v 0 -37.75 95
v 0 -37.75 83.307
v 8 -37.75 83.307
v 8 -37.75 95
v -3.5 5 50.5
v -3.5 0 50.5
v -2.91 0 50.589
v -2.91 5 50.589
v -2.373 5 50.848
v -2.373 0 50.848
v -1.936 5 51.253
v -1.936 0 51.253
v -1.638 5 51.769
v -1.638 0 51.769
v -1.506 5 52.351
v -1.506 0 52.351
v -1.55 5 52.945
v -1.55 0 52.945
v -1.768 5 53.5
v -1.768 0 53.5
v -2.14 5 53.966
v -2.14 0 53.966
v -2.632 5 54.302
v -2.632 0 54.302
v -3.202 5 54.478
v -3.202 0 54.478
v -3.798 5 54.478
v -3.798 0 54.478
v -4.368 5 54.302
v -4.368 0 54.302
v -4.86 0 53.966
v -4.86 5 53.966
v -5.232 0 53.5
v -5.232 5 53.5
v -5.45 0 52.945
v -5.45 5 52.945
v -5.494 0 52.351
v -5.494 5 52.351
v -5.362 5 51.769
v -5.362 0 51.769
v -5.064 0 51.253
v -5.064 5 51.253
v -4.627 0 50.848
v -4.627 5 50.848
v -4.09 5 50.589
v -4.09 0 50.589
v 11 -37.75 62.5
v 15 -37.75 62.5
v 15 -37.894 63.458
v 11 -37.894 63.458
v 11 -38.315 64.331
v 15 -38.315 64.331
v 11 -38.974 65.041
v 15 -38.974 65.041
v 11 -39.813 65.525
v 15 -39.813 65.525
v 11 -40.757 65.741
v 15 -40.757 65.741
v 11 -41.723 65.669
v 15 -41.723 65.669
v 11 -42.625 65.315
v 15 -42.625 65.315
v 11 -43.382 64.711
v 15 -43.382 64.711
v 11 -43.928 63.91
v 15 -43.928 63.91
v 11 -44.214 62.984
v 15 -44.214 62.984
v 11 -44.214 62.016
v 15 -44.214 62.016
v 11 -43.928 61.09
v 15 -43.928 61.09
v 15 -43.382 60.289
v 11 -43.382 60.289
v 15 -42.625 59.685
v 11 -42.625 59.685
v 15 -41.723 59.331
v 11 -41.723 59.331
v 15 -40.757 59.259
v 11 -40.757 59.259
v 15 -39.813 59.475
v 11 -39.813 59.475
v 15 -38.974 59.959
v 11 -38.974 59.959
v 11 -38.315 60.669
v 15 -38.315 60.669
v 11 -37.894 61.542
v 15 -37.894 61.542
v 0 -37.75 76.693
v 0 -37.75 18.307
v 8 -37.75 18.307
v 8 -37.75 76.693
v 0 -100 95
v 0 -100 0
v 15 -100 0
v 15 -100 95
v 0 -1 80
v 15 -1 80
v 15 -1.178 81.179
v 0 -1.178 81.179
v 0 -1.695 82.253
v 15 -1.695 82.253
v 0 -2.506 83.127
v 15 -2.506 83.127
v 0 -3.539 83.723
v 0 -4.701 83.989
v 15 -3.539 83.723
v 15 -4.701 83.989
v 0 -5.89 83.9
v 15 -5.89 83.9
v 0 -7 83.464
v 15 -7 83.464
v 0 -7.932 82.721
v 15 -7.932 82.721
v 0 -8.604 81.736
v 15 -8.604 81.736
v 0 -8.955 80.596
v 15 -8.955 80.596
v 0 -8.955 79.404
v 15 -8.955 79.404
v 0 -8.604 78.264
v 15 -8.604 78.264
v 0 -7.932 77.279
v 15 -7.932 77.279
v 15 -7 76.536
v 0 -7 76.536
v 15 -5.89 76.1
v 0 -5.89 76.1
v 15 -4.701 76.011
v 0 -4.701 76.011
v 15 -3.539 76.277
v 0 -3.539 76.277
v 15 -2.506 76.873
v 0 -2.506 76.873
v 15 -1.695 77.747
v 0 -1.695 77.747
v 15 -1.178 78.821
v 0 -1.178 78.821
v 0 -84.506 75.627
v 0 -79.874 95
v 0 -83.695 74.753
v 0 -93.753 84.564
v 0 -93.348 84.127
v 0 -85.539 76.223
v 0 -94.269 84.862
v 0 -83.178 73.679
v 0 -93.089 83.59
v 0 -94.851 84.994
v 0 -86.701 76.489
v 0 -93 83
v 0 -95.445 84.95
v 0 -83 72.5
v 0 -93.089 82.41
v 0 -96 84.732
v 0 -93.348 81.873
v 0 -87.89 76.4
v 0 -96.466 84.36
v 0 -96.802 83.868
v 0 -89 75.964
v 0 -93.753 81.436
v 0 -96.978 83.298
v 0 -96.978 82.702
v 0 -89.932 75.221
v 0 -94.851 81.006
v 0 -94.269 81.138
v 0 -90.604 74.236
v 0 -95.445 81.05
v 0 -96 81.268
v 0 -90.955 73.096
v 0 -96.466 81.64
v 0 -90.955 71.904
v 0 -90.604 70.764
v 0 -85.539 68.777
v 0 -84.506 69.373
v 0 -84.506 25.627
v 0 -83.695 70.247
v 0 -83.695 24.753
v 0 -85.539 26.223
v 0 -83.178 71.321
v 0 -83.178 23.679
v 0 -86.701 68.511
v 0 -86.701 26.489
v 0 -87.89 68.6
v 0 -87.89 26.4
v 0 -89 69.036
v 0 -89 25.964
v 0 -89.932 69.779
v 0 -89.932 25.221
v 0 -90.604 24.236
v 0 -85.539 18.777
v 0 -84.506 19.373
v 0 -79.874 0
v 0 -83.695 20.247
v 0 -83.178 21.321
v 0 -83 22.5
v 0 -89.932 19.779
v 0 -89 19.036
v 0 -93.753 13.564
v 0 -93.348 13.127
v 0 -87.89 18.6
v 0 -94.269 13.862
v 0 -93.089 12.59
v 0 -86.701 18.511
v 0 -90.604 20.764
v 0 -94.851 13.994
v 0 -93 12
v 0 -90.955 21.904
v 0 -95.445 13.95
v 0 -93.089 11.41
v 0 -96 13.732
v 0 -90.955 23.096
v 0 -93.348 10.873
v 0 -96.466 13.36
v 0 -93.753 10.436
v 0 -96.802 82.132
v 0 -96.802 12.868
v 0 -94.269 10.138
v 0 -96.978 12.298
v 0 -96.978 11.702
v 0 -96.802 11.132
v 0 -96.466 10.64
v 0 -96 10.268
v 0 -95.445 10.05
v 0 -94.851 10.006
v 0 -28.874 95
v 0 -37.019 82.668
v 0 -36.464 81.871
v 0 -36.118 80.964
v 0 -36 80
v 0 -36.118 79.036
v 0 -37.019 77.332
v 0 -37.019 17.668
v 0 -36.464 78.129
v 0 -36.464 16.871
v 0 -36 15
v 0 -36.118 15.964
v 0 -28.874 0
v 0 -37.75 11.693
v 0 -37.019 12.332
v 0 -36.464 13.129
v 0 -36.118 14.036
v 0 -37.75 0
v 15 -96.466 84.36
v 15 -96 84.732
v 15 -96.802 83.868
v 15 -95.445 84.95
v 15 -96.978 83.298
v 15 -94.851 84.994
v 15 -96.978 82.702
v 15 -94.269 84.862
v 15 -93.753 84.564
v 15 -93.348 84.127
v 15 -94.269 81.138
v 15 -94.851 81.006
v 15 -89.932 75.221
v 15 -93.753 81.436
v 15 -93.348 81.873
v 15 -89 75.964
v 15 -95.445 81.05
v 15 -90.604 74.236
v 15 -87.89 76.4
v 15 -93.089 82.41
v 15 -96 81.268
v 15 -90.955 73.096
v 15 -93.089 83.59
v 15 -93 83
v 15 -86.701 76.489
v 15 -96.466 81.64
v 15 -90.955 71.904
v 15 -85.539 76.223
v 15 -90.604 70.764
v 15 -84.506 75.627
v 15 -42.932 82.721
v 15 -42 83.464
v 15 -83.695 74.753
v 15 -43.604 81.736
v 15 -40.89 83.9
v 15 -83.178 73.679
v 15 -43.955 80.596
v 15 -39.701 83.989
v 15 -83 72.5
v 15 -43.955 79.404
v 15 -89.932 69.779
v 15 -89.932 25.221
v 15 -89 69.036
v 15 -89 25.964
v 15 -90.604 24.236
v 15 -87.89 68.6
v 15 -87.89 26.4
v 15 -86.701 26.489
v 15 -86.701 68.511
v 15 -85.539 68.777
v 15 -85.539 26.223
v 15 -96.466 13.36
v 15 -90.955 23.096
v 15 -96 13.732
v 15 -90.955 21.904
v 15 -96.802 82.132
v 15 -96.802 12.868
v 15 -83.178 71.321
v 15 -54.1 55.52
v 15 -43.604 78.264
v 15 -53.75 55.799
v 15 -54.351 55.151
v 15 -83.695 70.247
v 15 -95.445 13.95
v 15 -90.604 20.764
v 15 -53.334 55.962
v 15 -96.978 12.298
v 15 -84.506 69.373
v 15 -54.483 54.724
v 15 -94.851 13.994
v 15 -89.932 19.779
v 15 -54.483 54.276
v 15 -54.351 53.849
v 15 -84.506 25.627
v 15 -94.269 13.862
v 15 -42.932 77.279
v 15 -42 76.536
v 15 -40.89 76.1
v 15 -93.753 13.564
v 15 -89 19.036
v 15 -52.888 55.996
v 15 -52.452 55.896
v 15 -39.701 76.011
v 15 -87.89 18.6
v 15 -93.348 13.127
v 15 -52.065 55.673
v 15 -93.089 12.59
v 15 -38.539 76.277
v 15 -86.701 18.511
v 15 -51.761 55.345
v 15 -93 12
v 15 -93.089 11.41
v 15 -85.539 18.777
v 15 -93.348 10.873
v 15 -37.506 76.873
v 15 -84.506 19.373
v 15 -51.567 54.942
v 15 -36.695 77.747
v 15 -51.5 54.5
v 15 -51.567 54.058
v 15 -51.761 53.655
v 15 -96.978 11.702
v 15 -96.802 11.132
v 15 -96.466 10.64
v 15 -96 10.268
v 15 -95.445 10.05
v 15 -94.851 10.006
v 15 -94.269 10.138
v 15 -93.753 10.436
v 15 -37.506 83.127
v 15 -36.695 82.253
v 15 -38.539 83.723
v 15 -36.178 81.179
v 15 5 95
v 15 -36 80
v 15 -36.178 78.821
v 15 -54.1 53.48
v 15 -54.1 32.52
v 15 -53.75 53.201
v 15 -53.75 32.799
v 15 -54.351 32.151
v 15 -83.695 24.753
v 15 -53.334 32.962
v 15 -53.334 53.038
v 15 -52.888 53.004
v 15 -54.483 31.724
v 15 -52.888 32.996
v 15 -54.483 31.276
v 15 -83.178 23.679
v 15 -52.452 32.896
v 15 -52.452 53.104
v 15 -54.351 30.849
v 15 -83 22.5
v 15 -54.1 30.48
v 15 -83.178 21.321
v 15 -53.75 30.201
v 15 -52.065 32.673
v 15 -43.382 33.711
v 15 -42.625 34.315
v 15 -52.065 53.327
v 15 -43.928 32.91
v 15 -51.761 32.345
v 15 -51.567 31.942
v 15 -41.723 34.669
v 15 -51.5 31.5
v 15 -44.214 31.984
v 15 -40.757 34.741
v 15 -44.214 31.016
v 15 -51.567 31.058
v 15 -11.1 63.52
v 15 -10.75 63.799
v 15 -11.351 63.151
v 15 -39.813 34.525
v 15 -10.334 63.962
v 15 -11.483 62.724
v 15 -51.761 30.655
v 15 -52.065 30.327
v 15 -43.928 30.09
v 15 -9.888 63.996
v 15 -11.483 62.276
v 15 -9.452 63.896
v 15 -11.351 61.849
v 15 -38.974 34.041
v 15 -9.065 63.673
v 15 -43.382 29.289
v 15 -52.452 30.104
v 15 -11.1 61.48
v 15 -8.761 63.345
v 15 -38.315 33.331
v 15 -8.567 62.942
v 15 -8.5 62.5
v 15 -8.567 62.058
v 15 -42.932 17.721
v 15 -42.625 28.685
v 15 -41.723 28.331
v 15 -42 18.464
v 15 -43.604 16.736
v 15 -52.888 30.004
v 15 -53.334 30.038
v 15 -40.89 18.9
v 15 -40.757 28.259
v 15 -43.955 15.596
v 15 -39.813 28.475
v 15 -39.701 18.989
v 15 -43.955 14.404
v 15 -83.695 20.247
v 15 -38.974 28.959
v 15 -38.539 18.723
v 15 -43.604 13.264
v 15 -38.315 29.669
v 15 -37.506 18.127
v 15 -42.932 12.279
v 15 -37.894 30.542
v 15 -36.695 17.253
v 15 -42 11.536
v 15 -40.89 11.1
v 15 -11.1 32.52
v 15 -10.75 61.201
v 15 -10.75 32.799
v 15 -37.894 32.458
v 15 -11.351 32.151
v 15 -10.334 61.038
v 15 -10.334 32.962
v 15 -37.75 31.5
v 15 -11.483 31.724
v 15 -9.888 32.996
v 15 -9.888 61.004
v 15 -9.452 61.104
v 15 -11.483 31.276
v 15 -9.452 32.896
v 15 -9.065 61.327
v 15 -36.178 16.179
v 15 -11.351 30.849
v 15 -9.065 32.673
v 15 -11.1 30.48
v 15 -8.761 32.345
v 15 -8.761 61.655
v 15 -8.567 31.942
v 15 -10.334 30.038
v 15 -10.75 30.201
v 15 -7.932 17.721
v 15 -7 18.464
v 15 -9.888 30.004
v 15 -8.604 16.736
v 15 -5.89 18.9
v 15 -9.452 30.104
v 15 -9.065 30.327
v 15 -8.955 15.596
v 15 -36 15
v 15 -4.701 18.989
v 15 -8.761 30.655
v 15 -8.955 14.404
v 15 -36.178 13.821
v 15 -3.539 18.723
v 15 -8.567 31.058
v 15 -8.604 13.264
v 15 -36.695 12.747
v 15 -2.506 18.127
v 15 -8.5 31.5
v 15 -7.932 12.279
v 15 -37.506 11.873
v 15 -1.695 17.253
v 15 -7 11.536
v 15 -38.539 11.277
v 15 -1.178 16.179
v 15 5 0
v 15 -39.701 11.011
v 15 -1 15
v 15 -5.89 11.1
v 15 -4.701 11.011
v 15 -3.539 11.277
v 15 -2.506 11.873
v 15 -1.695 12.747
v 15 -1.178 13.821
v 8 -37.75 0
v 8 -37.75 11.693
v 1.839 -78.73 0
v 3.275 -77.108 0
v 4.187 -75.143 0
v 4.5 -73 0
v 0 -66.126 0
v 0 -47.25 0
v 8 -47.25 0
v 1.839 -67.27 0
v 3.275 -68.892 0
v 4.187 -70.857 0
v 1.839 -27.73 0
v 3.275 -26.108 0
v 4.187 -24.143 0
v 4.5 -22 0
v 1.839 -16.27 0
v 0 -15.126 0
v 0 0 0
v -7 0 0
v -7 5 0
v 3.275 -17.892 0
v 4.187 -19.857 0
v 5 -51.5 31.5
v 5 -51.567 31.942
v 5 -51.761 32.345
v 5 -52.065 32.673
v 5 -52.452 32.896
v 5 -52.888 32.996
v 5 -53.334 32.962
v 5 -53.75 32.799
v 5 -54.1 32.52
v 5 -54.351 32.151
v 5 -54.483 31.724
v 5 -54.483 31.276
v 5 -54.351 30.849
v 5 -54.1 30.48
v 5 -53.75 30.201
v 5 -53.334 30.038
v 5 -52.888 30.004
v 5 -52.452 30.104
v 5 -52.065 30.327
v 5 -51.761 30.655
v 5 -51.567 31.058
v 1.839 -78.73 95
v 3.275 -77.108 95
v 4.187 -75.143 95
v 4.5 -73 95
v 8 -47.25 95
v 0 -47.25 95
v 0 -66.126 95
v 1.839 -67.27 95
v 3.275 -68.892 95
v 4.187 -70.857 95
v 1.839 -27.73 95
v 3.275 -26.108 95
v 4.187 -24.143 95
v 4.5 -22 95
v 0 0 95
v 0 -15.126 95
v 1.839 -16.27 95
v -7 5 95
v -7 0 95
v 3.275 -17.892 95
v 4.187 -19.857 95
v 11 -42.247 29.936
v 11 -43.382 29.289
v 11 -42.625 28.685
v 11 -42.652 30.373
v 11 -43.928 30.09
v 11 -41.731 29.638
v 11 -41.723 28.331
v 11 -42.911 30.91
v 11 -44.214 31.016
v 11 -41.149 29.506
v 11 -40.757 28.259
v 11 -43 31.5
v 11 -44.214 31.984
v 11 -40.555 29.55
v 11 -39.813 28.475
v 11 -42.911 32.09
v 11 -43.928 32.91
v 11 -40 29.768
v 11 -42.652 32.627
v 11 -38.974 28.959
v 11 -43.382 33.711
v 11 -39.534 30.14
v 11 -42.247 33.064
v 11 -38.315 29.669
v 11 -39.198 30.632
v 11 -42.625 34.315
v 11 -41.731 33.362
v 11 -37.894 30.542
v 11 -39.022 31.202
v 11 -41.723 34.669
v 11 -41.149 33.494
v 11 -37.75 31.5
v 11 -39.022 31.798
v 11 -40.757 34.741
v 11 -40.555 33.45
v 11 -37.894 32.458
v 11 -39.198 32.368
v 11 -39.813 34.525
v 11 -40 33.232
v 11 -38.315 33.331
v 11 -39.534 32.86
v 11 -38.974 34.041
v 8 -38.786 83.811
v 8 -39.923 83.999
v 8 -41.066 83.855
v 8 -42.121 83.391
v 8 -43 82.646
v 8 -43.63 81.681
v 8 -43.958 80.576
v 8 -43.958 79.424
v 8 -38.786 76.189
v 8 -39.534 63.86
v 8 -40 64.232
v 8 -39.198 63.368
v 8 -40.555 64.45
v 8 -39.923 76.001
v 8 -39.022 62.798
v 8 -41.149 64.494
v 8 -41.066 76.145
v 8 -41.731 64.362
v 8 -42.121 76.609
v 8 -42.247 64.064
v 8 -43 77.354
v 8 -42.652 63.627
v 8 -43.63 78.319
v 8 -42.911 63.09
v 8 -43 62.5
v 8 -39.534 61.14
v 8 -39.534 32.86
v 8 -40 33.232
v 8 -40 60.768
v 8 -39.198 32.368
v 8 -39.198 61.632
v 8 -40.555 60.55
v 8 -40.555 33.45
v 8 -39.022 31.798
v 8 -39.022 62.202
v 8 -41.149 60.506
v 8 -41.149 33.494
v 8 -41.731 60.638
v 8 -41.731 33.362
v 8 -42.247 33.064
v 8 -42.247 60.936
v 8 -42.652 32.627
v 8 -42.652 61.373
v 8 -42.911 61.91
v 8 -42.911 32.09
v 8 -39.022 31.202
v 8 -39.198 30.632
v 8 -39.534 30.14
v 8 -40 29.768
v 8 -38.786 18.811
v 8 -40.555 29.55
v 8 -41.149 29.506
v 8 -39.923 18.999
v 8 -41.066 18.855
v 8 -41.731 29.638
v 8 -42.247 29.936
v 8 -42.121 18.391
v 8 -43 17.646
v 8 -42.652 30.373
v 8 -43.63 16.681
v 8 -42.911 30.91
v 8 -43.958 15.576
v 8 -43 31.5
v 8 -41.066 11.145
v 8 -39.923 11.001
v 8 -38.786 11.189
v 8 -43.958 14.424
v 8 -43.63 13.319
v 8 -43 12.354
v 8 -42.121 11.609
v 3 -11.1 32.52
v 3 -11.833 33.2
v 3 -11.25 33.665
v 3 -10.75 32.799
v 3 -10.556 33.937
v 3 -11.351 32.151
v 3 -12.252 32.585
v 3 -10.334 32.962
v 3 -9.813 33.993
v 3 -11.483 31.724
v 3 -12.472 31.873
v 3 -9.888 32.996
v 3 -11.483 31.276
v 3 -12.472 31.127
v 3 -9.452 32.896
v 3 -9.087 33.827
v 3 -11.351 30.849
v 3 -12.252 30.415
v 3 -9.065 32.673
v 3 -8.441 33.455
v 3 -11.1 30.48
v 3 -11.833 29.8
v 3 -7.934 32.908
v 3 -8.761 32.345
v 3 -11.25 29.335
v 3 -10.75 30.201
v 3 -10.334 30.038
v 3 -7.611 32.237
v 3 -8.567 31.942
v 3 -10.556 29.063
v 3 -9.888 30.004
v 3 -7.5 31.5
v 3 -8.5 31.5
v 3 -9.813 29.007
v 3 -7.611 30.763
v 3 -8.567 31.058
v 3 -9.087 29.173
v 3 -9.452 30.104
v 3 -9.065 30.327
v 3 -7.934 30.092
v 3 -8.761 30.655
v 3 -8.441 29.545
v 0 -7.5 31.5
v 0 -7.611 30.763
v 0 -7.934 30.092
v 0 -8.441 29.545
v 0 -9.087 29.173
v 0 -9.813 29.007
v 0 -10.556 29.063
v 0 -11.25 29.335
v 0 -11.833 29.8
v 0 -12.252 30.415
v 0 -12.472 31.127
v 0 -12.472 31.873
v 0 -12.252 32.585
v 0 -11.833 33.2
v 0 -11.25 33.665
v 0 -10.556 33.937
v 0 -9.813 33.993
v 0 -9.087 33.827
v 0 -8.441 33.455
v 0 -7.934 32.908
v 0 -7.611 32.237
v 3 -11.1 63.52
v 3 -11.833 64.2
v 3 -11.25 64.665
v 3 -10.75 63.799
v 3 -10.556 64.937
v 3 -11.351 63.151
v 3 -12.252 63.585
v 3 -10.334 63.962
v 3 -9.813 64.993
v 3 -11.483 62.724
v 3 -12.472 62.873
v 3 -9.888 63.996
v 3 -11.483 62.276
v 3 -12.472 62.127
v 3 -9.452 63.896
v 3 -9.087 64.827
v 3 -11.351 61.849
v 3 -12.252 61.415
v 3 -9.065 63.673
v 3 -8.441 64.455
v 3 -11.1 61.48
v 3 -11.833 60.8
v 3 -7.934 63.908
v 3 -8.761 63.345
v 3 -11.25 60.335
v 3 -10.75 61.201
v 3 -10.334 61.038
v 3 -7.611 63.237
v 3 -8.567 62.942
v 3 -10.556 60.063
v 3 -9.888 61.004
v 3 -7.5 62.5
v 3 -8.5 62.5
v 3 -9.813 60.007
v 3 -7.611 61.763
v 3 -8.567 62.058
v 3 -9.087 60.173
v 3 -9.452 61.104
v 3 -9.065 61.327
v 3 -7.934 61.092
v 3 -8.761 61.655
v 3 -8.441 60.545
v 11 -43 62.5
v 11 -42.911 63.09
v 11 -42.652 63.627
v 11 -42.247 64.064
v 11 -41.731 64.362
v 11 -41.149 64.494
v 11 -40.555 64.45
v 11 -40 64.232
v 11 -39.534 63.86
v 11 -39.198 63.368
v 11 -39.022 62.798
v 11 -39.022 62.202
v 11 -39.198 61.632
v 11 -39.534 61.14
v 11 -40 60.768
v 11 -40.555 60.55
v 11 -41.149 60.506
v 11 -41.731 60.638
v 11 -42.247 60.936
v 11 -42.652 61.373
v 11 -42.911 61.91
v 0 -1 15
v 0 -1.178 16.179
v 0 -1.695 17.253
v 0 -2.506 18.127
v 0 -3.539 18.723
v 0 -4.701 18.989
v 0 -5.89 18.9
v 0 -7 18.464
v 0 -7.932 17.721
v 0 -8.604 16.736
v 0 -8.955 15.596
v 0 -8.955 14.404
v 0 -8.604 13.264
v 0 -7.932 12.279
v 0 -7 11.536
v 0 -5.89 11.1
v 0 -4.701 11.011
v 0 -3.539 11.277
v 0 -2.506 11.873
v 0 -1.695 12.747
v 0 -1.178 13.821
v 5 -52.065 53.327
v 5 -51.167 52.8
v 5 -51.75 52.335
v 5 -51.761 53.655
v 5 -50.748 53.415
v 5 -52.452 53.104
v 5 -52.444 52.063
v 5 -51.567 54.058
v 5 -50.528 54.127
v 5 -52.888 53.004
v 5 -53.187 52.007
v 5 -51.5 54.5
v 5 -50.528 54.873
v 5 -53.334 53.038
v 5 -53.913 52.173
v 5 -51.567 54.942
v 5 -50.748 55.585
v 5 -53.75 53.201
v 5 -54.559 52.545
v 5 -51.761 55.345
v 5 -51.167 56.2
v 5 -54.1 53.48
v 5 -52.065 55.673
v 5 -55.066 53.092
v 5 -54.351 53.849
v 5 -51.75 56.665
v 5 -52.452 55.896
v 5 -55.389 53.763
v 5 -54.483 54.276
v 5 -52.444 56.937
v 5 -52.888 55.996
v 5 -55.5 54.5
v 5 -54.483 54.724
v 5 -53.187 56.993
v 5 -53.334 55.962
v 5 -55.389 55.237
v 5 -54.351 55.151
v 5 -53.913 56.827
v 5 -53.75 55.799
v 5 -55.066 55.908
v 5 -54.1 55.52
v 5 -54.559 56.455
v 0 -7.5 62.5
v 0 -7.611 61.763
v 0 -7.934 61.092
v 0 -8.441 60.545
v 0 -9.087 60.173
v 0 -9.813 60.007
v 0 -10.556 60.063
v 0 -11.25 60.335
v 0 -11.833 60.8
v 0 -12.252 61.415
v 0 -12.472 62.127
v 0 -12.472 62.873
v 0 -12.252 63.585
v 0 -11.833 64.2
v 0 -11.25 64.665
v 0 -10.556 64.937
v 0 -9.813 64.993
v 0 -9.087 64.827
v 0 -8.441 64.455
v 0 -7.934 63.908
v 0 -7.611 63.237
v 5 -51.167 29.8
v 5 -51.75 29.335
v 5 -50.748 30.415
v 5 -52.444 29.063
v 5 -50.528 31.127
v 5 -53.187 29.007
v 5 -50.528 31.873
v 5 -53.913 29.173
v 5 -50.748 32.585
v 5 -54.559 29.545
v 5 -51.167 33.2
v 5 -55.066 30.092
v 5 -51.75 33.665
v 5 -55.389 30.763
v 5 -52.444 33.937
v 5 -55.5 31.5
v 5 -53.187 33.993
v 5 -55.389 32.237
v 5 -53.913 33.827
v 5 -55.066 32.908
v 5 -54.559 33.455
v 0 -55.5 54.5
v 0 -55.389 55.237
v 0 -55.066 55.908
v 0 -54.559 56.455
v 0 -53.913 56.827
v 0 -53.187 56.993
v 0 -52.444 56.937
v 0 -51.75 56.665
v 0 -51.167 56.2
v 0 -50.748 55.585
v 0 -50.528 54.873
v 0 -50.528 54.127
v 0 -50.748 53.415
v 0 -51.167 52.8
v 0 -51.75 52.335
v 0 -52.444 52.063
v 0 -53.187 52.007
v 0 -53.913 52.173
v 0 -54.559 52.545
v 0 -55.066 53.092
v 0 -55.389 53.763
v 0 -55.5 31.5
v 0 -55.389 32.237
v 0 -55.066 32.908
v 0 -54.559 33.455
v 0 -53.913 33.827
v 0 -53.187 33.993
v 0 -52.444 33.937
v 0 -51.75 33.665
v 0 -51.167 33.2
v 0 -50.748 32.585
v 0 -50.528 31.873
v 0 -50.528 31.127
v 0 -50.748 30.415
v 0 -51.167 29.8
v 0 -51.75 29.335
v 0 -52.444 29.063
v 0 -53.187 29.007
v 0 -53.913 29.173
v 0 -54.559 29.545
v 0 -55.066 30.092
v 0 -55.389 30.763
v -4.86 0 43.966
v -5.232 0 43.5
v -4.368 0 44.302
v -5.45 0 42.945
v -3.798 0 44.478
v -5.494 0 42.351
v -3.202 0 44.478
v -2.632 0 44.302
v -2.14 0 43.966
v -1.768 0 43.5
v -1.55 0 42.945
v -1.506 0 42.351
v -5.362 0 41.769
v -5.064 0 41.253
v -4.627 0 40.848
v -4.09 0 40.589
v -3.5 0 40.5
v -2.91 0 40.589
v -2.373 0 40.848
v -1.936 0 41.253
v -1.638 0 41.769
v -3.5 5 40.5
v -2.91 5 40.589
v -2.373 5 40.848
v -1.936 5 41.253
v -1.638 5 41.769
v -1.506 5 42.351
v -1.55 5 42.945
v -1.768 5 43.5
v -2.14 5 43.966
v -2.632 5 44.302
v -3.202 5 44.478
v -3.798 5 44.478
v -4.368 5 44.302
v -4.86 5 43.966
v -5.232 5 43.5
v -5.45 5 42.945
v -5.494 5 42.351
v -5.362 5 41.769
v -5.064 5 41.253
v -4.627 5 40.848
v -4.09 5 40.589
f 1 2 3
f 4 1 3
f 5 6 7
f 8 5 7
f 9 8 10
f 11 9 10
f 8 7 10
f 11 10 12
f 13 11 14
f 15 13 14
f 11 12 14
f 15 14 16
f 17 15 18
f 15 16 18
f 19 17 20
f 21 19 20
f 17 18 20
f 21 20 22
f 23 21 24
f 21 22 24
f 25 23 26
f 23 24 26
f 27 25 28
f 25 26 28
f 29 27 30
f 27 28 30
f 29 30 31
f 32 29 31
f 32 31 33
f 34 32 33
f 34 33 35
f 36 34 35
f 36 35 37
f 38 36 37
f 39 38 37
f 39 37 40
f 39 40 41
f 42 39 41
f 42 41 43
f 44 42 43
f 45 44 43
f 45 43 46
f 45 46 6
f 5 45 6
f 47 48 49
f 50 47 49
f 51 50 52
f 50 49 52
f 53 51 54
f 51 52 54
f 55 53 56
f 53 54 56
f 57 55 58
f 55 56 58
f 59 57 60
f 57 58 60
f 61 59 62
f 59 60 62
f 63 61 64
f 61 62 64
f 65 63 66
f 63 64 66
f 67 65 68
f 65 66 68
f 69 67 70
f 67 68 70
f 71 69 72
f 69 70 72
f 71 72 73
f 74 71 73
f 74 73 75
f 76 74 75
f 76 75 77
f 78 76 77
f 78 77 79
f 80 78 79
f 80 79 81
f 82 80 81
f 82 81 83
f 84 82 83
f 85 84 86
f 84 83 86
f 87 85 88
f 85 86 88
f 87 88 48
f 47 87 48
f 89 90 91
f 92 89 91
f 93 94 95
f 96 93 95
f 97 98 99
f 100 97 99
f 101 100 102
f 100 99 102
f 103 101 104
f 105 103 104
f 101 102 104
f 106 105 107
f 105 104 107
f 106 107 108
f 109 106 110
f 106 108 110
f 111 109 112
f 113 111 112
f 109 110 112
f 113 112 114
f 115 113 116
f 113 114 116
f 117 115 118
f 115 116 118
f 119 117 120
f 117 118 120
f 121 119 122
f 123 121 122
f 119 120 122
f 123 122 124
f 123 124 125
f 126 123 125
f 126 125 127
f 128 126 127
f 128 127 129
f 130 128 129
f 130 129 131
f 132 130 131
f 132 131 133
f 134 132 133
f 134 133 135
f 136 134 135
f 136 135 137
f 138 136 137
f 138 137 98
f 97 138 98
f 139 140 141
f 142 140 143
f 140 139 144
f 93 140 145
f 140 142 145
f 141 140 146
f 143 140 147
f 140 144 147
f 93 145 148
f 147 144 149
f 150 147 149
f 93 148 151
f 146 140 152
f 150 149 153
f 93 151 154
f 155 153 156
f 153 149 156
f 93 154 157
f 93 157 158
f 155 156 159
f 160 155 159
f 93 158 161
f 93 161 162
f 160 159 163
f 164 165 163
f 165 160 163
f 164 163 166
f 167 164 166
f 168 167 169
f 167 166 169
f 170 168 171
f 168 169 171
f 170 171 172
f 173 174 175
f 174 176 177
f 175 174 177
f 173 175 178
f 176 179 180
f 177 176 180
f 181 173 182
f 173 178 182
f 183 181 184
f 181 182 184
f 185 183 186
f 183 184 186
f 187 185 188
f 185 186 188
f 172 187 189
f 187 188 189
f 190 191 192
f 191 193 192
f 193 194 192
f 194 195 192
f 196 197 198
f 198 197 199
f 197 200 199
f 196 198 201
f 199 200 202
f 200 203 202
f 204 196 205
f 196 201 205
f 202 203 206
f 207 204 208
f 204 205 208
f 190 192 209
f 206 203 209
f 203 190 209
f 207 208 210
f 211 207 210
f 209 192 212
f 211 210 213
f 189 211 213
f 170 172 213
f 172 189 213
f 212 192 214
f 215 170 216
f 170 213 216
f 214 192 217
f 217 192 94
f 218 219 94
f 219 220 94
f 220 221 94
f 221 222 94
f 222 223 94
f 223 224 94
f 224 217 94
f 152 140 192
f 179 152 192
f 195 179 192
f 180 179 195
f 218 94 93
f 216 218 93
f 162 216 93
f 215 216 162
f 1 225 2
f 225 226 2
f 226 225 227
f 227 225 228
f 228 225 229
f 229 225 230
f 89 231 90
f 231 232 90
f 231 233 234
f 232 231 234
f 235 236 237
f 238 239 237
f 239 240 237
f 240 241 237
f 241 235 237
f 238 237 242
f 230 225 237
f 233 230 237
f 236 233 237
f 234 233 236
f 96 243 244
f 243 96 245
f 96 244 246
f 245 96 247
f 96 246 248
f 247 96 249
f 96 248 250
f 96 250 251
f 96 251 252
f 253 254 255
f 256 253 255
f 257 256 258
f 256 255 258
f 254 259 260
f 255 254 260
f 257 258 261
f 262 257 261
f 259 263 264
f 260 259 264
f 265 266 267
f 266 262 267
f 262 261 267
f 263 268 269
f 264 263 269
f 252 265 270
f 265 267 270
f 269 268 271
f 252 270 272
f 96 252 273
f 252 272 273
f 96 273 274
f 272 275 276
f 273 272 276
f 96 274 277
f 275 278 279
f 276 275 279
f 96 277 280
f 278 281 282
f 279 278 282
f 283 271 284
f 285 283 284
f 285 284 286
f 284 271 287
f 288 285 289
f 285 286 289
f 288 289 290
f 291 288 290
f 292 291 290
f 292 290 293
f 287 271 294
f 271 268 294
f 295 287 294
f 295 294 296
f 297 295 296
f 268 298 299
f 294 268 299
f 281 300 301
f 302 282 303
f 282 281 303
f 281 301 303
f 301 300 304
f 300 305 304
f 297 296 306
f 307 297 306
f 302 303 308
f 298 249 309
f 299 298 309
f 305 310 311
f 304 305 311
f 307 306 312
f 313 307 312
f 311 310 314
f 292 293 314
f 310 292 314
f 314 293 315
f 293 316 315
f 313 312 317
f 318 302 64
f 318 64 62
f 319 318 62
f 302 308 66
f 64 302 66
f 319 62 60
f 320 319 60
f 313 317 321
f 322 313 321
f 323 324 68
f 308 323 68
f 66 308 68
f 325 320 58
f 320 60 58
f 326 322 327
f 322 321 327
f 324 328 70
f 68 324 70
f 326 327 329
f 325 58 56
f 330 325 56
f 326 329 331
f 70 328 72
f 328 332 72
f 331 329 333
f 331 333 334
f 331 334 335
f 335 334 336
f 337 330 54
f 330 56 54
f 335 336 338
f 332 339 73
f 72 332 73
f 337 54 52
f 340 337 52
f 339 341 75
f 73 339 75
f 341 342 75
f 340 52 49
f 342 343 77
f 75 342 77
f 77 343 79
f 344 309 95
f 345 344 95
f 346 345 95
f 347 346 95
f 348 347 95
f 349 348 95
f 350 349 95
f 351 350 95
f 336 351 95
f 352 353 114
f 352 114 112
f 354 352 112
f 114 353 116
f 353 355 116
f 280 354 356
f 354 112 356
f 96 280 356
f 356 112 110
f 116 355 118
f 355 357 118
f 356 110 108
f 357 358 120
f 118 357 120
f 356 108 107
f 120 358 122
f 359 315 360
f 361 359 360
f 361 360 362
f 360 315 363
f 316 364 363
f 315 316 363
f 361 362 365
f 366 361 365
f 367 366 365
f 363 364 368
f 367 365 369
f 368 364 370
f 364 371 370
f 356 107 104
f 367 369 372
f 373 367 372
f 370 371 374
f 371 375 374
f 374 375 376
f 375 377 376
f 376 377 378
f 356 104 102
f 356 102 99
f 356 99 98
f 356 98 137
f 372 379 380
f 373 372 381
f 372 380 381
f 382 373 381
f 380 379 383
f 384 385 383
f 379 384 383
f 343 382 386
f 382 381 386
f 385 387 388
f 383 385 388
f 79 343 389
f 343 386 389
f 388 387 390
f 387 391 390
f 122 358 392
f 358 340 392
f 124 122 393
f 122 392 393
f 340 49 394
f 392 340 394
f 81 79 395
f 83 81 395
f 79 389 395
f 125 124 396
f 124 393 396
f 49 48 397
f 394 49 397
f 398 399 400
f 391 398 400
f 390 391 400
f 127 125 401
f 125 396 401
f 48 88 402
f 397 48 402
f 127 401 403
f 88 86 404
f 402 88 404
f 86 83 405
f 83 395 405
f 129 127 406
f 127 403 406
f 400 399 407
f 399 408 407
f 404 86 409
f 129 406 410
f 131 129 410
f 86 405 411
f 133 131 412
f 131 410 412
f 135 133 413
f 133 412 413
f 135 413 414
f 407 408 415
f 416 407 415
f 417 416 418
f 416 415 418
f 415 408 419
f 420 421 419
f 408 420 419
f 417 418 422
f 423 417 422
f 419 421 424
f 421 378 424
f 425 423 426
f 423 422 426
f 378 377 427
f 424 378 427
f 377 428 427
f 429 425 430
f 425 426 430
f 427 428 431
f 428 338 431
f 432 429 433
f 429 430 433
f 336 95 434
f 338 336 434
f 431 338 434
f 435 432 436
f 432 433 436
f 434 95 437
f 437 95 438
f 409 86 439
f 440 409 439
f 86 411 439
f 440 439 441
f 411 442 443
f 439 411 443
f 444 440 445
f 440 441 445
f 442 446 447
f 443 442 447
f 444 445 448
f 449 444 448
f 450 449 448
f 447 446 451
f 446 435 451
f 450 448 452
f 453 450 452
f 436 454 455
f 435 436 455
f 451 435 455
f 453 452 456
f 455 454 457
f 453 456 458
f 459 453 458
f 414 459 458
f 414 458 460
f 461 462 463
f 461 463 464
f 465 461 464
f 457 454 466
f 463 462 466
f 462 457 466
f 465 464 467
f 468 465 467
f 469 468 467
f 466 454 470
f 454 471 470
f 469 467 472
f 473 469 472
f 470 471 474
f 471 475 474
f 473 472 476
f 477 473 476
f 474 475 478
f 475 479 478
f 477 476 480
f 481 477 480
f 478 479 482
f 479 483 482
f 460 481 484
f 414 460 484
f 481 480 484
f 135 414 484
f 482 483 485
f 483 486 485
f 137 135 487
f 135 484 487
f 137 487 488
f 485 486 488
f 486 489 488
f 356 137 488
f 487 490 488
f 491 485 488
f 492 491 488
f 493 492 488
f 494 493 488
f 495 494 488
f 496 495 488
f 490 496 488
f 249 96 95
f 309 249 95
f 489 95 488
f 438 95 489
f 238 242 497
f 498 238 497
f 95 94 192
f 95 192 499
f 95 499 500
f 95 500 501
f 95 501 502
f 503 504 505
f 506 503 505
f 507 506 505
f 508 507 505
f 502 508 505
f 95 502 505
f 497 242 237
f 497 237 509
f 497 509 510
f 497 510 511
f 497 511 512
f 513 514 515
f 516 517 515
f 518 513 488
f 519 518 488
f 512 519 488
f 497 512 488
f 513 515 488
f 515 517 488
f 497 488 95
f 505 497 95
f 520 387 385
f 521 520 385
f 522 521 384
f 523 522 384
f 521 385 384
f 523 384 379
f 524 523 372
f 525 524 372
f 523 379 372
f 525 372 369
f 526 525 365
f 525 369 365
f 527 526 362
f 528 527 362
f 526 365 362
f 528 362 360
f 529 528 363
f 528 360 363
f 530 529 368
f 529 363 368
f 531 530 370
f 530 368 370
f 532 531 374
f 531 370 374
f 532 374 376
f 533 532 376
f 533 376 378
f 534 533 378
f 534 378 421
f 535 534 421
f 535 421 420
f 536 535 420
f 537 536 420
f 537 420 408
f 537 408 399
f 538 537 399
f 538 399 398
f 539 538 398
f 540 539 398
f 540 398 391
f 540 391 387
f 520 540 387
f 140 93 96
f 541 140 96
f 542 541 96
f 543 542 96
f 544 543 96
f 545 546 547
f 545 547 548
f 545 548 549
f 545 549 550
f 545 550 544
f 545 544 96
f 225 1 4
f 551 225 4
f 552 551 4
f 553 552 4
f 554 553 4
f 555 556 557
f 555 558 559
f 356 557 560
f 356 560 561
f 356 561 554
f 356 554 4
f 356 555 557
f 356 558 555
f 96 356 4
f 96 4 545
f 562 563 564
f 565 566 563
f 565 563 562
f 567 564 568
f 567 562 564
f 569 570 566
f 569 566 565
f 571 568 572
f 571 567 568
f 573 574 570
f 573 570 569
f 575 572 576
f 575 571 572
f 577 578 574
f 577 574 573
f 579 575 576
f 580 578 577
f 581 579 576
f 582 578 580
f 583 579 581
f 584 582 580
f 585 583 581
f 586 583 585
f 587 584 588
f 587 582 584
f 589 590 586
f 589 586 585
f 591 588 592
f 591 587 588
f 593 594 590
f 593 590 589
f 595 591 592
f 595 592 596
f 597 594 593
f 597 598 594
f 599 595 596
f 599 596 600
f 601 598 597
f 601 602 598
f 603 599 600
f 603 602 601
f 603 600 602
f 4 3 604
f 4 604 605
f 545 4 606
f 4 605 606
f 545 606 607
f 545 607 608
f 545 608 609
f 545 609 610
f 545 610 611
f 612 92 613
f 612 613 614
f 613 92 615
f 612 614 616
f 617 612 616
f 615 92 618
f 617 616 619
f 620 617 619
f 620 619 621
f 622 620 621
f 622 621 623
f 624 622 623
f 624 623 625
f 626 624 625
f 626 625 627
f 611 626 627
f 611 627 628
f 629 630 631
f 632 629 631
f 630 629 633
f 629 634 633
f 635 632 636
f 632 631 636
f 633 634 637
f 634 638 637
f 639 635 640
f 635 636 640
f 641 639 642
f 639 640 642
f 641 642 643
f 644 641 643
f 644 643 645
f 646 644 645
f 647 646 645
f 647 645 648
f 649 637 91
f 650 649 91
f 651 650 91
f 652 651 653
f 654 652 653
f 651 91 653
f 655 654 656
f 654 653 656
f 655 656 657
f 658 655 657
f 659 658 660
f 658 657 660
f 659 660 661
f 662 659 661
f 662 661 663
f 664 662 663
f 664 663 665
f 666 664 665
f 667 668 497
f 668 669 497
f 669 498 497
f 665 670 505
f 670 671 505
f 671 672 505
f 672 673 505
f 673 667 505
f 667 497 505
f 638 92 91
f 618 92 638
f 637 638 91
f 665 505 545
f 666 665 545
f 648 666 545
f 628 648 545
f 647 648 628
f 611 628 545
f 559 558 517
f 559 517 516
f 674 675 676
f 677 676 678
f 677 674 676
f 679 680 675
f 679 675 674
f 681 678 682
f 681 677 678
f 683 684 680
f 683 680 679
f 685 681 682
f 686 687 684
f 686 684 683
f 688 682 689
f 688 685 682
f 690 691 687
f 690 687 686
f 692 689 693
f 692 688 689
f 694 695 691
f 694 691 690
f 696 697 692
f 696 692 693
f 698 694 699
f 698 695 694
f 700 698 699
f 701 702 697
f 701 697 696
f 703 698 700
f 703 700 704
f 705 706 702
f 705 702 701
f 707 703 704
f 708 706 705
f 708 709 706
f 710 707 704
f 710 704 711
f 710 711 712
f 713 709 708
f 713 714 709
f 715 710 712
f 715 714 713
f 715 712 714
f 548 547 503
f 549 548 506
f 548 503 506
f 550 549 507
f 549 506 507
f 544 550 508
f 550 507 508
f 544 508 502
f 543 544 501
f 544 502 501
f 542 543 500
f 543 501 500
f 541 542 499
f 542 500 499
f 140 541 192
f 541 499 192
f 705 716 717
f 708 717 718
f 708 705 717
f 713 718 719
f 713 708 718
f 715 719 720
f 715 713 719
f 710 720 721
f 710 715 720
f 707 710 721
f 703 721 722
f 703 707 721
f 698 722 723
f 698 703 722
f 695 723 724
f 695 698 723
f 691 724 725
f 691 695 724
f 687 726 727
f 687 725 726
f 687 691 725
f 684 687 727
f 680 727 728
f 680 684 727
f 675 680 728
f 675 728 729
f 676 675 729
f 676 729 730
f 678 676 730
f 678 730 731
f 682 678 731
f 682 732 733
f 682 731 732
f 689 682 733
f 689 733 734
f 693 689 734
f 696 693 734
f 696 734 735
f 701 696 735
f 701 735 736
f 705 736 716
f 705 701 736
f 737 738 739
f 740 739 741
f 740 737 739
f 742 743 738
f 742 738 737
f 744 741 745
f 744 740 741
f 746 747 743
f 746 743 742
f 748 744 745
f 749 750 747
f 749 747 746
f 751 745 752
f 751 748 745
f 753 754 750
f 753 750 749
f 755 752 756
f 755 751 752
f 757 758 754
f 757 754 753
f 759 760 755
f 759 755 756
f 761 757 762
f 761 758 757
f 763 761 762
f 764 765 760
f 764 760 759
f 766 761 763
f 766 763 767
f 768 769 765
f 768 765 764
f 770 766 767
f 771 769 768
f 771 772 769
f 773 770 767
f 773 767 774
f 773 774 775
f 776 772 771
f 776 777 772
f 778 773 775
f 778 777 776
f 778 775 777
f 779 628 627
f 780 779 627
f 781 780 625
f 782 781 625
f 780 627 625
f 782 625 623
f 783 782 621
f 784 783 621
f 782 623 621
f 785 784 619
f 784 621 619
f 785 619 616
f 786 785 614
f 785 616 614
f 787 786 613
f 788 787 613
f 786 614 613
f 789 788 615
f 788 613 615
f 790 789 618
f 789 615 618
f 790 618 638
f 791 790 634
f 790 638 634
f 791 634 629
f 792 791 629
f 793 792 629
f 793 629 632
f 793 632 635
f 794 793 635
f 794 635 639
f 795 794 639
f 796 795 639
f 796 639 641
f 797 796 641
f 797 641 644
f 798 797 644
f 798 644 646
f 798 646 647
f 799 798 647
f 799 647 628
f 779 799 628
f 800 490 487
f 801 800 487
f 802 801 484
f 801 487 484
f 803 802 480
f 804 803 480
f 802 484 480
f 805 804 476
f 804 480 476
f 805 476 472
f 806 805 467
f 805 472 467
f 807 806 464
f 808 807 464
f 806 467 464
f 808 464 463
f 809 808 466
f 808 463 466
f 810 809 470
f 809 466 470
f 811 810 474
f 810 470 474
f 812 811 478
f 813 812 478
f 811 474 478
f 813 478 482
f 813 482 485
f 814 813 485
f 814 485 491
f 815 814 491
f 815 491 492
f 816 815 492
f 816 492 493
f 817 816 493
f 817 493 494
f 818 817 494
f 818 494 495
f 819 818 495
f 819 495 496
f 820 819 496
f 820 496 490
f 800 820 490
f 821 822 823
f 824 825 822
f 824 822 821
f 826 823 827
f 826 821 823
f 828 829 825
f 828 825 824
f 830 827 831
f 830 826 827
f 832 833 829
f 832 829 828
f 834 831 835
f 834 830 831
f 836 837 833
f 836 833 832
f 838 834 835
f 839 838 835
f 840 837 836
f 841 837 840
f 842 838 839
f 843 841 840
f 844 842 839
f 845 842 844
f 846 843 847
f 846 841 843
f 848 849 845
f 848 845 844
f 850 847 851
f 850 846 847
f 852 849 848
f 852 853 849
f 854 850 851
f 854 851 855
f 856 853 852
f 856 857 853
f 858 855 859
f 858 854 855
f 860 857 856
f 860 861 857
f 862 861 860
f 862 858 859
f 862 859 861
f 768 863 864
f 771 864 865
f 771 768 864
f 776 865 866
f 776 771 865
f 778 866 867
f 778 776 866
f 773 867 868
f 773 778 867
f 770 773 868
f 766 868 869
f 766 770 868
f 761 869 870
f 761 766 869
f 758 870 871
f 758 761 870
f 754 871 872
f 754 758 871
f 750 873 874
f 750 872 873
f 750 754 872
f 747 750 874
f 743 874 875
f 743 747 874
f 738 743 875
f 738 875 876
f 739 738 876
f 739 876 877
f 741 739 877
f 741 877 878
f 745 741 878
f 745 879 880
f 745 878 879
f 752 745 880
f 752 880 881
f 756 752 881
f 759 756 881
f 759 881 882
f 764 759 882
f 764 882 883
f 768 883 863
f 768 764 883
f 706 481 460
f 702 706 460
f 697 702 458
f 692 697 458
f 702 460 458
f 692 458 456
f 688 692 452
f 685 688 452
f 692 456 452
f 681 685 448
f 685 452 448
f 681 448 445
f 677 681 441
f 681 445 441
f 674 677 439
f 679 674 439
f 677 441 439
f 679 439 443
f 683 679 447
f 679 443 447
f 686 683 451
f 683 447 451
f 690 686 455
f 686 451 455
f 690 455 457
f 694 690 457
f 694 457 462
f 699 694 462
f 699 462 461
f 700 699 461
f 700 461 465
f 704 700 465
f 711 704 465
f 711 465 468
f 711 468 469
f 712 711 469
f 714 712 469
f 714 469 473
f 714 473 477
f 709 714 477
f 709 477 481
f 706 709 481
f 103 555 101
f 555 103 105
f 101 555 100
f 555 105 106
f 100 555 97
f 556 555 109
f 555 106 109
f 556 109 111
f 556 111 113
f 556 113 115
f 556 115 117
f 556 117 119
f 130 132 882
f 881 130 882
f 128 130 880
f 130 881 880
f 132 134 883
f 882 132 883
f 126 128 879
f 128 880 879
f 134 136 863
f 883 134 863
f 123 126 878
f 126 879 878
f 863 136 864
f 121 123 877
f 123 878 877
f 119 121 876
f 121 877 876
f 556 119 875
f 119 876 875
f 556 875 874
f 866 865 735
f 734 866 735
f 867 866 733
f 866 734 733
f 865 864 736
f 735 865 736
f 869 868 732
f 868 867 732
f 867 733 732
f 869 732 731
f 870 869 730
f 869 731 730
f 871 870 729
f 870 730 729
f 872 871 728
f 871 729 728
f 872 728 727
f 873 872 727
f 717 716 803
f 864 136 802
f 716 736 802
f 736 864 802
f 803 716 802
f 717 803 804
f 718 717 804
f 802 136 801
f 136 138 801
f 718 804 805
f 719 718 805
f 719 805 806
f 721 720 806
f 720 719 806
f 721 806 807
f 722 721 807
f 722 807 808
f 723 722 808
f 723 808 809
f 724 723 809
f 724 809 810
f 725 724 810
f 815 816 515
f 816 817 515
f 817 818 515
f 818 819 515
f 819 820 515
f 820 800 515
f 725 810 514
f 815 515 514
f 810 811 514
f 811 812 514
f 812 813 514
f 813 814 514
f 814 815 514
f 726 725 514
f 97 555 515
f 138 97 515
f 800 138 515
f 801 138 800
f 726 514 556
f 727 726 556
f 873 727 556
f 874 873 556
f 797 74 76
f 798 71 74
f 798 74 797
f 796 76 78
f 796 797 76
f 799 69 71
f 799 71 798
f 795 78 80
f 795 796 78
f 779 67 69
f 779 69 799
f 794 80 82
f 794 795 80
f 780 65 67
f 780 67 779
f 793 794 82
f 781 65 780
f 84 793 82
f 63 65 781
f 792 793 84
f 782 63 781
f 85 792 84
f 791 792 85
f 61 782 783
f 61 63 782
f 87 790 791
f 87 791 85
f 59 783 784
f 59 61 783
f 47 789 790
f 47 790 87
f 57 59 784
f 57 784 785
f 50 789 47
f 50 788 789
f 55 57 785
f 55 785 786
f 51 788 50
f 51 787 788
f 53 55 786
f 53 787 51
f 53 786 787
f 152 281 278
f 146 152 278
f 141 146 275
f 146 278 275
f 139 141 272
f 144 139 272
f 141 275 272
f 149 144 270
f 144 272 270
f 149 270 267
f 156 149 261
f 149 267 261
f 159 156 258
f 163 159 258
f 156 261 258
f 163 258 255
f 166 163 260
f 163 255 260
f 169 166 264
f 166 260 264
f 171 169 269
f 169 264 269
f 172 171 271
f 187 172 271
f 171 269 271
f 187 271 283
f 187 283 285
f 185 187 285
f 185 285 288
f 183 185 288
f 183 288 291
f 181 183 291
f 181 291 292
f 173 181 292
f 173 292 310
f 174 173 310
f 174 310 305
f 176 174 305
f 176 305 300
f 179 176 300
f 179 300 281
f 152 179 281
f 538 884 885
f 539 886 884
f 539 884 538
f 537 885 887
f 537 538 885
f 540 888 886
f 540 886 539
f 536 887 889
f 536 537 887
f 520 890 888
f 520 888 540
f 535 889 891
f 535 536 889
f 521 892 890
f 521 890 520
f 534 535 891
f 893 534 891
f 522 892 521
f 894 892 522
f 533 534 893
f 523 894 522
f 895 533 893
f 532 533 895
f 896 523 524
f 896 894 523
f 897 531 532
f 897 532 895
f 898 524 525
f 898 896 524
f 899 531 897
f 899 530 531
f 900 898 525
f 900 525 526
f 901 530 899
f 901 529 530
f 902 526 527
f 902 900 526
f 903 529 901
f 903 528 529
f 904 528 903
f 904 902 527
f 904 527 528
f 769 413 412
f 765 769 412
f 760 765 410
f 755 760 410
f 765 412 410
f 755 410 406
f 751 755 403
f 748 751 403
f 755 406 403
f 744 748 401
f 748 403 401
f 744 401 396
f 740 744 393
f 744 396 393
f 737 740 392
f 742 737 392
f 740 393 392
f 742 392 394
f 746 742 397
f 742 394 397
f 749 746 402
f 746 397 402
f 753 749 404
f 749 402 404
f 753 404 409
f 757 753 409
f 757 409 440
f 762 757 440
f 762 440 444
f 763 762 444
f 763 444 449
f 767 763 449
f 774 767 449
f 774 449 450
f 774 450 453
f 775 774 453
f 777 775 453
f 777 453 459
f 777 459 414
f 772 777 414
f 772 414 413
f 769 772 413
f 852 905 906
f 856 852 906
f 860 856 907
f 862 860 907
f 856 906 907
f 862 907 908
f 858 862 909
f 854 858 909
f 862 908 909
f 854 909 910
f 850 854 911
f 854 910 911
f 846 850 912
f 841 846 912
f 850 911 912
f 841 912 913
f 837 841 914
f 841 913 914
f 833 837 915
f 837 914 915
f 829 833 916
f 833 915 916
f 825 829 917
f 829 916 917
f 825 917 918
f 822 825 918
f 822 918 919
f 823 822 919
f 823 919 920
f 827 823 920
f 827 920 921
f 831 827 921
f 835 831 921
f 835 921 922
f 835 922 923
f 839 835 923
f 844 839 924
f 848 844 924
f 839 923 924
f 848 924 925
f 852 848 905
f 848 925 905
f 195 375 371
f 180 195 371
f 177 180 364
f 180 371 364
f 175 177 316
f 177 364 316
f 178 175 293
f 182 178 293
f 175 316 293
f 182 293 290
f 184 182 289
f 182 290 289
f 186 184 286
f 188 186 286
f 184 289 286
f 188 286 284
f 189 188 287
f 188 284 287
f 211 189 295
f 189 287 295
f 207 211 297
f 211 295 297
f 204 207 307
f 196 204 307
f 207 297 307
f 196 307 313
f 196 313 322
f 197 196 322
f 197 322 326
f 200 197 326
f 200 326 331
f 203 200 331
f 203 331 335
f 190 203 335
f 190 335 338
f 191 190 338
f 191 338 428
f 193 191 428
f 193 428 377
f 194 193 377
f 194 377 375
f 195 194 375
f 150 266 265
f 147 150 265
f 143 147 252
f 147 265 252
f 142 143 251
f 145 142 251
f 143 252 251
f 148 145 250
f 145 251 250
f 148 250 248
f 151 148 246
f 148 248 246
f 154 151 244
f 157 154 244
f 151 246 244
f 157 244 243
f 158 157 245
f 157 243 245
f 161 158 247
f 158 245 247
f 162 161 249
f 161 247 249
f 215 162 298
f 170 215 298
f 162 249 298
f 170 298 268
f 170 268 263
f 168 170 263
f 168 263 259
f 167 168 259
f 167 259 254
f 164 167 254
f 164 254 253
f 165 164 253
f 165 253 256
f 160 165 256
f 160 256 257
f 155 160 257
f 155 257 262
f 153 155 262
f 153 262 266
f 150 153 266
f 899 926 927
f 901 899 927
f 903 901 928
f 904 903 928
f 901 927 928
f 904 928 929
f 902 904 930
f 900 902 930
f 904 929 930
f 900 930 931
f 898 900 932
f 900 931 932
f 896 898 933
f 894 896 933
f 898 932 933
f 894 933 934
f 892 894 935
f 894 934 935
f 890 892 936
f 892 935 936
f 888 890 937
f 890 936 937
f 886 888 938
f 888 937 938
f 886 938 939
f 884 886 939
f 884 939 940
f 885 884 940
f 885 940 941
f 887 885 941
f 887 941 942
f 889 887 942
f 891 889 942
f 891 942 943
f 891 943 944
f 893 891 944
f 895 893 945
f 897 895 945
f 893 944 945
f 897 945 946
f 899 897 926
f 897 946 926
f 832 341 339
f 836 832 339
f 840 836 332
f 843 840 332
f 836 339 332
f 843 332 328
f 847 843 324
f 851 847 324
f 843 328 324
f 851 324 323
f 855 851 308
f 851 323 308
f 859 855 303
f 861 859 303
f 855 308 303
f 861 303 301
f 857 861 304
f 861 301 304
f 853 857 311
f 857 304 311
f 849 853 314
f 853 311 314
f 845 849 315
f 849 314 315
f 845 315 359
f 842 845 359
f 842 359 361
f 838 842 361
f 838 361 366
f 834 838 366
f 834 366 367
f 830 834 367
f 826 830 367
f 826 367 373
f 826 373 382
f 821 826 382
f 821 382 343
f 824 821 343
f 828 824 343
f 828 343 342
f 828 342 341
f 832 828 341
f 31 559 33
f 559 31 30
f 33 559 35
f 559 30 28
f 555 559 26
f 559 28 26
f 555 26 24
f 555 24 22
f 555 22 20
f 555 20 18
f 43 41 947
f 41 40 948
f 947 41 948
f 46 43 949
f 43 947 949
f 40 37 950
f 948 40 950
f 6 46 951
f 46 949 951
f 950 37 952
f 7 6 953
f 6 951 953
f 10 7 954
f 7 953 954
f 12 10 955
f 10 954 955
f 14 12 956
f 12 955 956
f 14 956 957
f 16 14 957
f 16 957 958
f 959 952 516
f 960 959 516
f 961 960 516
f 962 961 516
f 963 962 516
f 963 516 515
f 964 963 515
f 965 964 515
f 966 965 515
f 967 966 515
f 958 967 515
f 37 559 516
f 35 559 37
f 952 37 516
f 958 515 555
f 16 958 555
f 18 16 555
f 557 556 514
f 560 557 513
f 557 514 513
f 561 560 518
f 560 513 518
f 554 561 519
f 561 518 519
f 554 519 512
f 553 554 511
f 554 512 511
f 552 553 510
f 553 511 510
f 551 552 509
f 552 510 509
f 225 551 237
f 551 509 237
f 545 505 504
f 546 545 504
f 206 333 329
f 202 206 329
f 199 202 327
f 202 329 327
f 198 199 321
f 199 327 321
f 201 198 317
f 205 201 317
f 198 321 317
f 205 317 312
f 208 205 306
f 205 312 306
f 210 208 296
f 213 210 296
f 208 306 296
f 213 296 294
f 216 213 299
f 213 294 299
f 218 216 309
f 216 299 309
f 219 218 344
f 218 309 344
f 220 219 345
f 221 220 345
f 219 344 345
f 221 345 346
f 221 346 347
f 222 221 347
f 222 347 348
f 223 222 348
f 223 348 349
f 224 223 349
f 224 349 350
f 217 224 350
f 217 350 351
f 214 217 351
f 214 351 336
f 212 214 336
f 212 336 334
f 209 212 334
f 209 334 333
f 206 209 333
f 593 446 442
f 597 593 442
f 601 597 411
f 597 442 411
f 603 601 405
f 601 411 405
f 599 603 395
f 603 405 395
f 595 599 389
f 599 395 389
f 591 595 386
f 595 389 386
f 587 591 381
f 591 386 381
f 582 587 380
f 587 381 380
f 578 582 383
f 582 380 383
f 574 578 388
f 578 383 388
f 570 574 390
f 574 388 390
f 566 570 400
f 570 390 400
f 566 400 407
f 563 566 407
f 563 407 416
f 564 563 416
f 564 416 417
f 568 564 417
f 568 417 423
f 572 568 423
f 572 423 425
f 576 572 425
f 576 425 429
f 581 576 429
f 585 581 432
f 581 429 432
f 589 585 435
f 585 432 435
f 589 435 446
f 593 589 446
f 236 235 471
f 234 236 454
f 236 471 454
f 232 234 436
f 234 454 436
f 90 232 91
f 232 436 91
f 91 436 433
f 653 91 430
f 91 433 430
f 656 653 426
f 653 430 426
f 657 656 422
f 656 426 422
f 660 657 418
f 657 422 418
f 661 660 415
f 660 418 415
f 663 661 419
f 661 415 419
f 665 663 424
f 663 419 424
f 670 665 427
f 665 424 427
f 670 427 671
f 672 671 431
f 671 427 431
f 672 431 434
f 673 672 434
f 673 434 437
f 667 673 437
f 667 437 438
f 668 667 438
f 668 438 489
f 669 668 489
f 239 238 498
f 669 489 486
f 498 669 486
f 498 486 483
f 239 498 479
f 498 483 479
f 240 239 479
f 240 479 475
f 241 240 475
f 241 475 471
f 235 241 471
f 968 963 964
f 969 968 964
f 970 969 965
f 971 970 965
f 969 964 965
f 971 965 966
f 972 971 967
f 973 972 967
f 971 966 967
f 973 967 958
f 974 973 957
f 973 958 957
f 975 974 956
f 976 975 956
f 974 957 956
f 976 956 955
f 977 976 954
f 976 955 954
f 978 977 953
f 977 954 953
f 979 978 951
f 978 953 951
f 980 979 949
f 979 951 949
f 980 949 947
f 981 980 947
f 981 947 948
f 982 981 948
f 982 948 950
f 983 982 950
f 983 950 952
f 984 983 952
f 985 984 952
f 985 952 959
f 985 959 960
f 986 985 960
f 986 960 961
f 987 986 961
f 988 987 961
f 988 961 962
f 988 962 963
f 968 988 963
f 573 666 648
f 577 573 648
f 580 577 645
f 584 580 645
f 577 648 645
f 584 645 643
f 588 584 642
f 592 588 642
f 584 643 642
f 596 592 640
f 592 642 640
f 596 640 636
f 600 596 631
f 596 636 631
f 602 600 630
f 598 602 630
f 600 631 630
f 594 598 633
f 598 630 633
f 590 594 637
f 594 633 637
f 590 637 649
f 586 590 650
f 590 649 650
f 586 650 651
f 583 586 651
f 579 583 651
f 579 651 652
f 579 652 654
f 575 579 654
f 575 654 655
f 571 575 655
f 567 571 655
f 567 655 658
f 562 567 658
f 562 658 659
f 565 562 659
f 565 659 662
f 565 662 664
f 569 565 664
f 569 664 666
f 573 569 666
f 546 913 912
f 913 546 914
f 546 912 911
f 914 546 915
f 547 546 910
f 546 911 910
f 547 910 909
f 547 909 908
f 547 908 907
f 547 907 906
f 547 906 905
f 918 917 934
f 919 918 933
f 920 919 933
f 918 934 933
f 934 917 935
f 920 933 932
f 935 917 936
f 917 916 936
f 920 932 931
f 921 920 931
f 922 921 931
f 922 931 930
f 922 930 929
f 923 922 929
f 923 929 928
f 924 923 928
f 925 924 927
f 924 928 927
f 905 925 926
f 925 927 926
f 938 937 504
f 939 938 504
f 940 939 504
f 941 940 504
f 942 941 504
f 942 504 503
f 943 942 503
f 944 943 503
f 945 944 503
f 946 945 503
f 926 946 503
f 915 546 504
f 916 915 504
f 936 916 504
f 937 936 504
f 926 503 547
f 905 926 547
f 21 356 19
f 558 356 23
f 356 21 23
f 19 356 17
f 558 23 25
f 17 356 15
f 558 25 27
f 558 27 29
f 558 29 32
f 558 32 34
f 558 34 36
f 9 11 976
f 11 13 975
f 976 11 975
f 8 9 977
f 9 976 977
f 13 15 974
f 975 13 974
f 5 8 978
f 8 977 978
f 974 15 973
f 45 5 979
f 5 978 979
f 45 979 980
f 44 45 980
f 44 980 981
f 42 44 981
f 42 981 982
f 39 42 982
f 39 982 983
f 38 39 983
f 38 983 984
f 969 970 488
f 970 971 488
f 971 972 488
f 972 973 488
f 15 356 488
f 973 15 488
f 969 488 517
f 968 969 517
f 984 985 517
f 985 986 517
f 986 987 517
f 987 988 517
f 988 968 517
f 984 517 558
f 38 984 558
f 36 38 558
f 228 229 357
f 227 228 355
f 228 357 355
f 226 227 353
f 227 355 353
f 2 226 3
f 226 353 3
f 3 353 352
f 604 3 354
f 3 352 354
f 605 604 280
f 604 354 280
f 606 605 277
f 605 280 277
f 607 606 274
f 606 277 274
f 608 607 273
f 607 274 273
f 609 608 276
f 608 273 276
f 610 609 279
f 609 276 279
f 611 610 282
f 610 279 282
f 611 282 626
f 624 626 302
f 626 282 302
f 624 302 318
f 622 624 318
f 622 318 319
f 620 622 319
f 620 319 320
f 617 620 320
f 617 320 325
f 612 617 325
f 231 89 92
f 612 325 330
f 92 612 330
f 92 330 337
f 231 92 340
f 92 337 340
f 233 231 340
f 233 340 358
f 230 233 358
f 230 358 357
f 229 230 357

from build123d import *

# Parameters (mm, degrees)
BOSS_EXTRUDE1_DEPTH                = 95
SKETCH2_R                          = 2
CUT_EXTRUDE1_3DPRINTER4_DEPTH      = 139.744369255
ESQUISSE1_R                        = 1.5
ENL_V_MAT_EXTRU_1_3D_PRINTER_DEPTH = 140.67462189
ENL_V_MAT_EXTRU_2_DEPTH            = 139.744369255
ENL_V_MAT_EXTRU_2_DEPTH_BACK       = 3
ESQUISSE2_R                        = 2.5
ESQUISSE3_R                        = 3.25
ENL_V_MAT_EXTRU_3_DEPTH            = 4
ESQUISSE4_R                        = 2
ENL_V_MAT_EXTRU_4_DEPTH            = 140.67462189
ESQUISSE8_R                        = 7.5
ENL_V_MAT_EXTRU_9_DEPTH            = 139.744369255
ESQUISSE9_R                        = 4
ENL_V_MAT_EXTRU_10CNC_TROUS_DEPTH  = 140.67462189
ESQUISSE10_R                       = 2
ENL_V_MAT_EXTRU_10_DEPTH           = 139.744369255
ESQUISSE11_R                       = 2.5
ENL_V_MAT_EXTRU_11_DEPTH           = 5


with BuildPart() as part:
    # Sketch1 → Boss-Extrude1 (new body)
    with BuildSketch(Plane.XY):
        Polygon((0, 0), (0, -37.75), (8, -37.75), (8, -47.25), (0, -47.25), (0, -100), (15, -100), (15, 5), (-7, 5), (-7, 0), align=None)
    extrude(amount=BOSS_EXTRUDE1_DEPTH)

    # Sketch2 → Cut-Extrude1 3dprinter4 (cut, through all)
    with BuildSketch(Plane.ZY):
        with Locations(Location((62.5, -41, 0), (0, 0, 270))):
            Circle(SKETCH2_R)
        with Locations(Location((31.5, -41, 0), (0, 0, 270))):
            Circle(SKETCH2_R)
    extrude(amount=-CUT_EXTRUDE1_3DPRINTER4_DEPTH, mode=Mode.SUBTRACT)

    # Esquisse1 → Enlèv. mat.-Extru.1 3d printer (cut, through all)
    with BuildSketch(Plane(origin=(15, 0, 0), x_dir=(0, 0, -1), z_dir=(1, 0, 0))):
        with Locations(Location((-62.5, -10, 0), (0, 0, 90))):
            Circle(ESQUISSE1_R)
        with Locations(Location((-31.5, -10, 0), (0, 0, 90))):
            Circle(ESQUISSE1_R)
        with Locations(Location((-54.5, -53, 0), (0, 0, 90))):
            Circle(ESQUISSE1_R)
        with Locations(Location((-31.5, -53, 0), (0, 0, 90))):
            Circle(ESQUISSE1_R)
    extrude(amount=-ENL_V_MAT_EXTRU_1_3D_PRINTER_DEPTH, mode=Mode.SUBTRACT)

    # Esquisse2 → Enlèv. mat.-Extru.2 (cut, two sides: drawn at the far end of the back side and taken through both)
    with BuildSketch(Plane.ZY.offset(-ENL_V_MAT_EXTRU_2_DEPTH_BACK)):
        with Locations(Location((62.5, -10, 0), (0, 0, 90))):
            Circle(ESQUISSE2_R)
        with Locations(Location((31.5, -10, 0), (0, 0, 90))):
            Circle(ESQUISSE2_R)
    extrude(amount=ENL_V_MAT_EXTRU_2_DEPTH + ENL_V_MAT_EXTRU_2_DEPTH_BACK, mode=Mode.SUBTRACT)

    # Esquisse3 → Enlèv. mat.-Extru.3 (cut)
    with BuildSketch(Plane(origin=(15, 0, 0), x_dir=(0, 0, -1), z_dir=(1, 0, 0))):
        with Locations(Location((-31.5, -41, 0), (0, 0, 90))):
            Circle(ESQUISSE3_R)
        with Locations(Location((-62.5, -41, 0), (0, 0, 90))):
            Circle(ESQUISSE3_R)
    extrude(amount=-ENL_V_MAT_EXTRU_3_DEPTH, mode=Mode.SUBTRACT)

    # Esquisse4 → Enlèv. mat.-Extru.4 (cut, through all)
    with BuildSketch(Plane(origin=(15, 0, 0), x_dir=(0, 0, -1), z_dir=(1, 0, 0))):
        with Locations(Location((-83, -95, 0), (0, 0, 90))):
            Circle(ESQUISSE4_R)
        with Locations(Location((-12, -95, 0), (0, 0, 90))):
            Circle(ESQUISSE4_R)
    extrude(amount=-ENL_V_MAT_EXTRU_4_DEPTH, mode=Mode.SUBTRACT)

    # Esquisse8 → Enlèv. mat.-Extru.9 (cut, through all)
    with BuildSketch(Plane(origin=(0, 0, 0), x_dir=(-1, 0, 0), z_dir=(0, 0, -1))):
        with Locations((3, -22)):
            Circle(ESQUISSE8_R)
        with Locations((3, -73)):
            Circle(ESQUISSE8_R)
    extrude(amount=-ENL_V_MAT_EXTRU_9_DEPTH, mode=Mode.SUBTRACT)

    # Esquisse9 → Enlèv. mat.-Extru.10cnc trous (cut, through all)
    with BuildSketch(Plane(origin=(15, 0, 0), x_dir=(0, 0, -1), z_dir=(1, 0, 0))):
        with Locations(Location((-15, -5, 0), (0, 0, 90))):
            Circle(ESQUISSE9_R)
        with Locations(Location((-80, -5, 0), (0, 0, 90))):
            Circle(ESQUISSE9_R)
        with Locations(Location((-80, -40, 0), (0, 0, 90))):
            Circle(ESQUISSE9_R)
        with Locations(Location((-15, -40, 0), (0, 0, 90))):
            Circle(ESQUISSE9_R)
        with Locations(Location((-22.5, -87, 0), (0, 0, 90))):
            Circle(ESQUISSE9_R)
        with Locations(Location((-72.5, -87, 0), (0, 0, 90))):
            Circle(ESQUISSE9_R)
    extrude(amount=-ENL_V_MAT_EXTRU_10CNC_TROUS_DEPTH, mode=Mode.SUBTRACT)

    # Esquisse10 → Enlèv. mat.-Extru.10 (cut, through all)
    with BuildSketch(Plane.XZ):
        with Locations(Location((-3.5, 52.5, 0), (0, 0, 270))):
            Circle(ESQUISSE10_R)
        with Locations(Location((-3.5, 42.5, 0), (0, 0, 270))):
            Circle(ESQUISSE10_R)
    extrude(amount=-ENL_V_MAT_EXTRU_10_DEPTH, mode=Mode.SUBTRACT)

    # Esquisse11 → Enlèv. mat.-Extru.11 (cut)
    with BuildSketch(Plane.ZY):
        with Locations(Location((54.5, -53, 0), (0, 0, 270))):
            Circle(ESQUISSE11_R)
        with Locations(Location((31.5, -53, 0), (0, 0, 270))):
            Circle(ESQUISSE11_R)
    extrude(amount=-ENL_V_MAT_EXTRU_11_DEPTH, mode=Mode.SUBTRACT)


solid = part.part
